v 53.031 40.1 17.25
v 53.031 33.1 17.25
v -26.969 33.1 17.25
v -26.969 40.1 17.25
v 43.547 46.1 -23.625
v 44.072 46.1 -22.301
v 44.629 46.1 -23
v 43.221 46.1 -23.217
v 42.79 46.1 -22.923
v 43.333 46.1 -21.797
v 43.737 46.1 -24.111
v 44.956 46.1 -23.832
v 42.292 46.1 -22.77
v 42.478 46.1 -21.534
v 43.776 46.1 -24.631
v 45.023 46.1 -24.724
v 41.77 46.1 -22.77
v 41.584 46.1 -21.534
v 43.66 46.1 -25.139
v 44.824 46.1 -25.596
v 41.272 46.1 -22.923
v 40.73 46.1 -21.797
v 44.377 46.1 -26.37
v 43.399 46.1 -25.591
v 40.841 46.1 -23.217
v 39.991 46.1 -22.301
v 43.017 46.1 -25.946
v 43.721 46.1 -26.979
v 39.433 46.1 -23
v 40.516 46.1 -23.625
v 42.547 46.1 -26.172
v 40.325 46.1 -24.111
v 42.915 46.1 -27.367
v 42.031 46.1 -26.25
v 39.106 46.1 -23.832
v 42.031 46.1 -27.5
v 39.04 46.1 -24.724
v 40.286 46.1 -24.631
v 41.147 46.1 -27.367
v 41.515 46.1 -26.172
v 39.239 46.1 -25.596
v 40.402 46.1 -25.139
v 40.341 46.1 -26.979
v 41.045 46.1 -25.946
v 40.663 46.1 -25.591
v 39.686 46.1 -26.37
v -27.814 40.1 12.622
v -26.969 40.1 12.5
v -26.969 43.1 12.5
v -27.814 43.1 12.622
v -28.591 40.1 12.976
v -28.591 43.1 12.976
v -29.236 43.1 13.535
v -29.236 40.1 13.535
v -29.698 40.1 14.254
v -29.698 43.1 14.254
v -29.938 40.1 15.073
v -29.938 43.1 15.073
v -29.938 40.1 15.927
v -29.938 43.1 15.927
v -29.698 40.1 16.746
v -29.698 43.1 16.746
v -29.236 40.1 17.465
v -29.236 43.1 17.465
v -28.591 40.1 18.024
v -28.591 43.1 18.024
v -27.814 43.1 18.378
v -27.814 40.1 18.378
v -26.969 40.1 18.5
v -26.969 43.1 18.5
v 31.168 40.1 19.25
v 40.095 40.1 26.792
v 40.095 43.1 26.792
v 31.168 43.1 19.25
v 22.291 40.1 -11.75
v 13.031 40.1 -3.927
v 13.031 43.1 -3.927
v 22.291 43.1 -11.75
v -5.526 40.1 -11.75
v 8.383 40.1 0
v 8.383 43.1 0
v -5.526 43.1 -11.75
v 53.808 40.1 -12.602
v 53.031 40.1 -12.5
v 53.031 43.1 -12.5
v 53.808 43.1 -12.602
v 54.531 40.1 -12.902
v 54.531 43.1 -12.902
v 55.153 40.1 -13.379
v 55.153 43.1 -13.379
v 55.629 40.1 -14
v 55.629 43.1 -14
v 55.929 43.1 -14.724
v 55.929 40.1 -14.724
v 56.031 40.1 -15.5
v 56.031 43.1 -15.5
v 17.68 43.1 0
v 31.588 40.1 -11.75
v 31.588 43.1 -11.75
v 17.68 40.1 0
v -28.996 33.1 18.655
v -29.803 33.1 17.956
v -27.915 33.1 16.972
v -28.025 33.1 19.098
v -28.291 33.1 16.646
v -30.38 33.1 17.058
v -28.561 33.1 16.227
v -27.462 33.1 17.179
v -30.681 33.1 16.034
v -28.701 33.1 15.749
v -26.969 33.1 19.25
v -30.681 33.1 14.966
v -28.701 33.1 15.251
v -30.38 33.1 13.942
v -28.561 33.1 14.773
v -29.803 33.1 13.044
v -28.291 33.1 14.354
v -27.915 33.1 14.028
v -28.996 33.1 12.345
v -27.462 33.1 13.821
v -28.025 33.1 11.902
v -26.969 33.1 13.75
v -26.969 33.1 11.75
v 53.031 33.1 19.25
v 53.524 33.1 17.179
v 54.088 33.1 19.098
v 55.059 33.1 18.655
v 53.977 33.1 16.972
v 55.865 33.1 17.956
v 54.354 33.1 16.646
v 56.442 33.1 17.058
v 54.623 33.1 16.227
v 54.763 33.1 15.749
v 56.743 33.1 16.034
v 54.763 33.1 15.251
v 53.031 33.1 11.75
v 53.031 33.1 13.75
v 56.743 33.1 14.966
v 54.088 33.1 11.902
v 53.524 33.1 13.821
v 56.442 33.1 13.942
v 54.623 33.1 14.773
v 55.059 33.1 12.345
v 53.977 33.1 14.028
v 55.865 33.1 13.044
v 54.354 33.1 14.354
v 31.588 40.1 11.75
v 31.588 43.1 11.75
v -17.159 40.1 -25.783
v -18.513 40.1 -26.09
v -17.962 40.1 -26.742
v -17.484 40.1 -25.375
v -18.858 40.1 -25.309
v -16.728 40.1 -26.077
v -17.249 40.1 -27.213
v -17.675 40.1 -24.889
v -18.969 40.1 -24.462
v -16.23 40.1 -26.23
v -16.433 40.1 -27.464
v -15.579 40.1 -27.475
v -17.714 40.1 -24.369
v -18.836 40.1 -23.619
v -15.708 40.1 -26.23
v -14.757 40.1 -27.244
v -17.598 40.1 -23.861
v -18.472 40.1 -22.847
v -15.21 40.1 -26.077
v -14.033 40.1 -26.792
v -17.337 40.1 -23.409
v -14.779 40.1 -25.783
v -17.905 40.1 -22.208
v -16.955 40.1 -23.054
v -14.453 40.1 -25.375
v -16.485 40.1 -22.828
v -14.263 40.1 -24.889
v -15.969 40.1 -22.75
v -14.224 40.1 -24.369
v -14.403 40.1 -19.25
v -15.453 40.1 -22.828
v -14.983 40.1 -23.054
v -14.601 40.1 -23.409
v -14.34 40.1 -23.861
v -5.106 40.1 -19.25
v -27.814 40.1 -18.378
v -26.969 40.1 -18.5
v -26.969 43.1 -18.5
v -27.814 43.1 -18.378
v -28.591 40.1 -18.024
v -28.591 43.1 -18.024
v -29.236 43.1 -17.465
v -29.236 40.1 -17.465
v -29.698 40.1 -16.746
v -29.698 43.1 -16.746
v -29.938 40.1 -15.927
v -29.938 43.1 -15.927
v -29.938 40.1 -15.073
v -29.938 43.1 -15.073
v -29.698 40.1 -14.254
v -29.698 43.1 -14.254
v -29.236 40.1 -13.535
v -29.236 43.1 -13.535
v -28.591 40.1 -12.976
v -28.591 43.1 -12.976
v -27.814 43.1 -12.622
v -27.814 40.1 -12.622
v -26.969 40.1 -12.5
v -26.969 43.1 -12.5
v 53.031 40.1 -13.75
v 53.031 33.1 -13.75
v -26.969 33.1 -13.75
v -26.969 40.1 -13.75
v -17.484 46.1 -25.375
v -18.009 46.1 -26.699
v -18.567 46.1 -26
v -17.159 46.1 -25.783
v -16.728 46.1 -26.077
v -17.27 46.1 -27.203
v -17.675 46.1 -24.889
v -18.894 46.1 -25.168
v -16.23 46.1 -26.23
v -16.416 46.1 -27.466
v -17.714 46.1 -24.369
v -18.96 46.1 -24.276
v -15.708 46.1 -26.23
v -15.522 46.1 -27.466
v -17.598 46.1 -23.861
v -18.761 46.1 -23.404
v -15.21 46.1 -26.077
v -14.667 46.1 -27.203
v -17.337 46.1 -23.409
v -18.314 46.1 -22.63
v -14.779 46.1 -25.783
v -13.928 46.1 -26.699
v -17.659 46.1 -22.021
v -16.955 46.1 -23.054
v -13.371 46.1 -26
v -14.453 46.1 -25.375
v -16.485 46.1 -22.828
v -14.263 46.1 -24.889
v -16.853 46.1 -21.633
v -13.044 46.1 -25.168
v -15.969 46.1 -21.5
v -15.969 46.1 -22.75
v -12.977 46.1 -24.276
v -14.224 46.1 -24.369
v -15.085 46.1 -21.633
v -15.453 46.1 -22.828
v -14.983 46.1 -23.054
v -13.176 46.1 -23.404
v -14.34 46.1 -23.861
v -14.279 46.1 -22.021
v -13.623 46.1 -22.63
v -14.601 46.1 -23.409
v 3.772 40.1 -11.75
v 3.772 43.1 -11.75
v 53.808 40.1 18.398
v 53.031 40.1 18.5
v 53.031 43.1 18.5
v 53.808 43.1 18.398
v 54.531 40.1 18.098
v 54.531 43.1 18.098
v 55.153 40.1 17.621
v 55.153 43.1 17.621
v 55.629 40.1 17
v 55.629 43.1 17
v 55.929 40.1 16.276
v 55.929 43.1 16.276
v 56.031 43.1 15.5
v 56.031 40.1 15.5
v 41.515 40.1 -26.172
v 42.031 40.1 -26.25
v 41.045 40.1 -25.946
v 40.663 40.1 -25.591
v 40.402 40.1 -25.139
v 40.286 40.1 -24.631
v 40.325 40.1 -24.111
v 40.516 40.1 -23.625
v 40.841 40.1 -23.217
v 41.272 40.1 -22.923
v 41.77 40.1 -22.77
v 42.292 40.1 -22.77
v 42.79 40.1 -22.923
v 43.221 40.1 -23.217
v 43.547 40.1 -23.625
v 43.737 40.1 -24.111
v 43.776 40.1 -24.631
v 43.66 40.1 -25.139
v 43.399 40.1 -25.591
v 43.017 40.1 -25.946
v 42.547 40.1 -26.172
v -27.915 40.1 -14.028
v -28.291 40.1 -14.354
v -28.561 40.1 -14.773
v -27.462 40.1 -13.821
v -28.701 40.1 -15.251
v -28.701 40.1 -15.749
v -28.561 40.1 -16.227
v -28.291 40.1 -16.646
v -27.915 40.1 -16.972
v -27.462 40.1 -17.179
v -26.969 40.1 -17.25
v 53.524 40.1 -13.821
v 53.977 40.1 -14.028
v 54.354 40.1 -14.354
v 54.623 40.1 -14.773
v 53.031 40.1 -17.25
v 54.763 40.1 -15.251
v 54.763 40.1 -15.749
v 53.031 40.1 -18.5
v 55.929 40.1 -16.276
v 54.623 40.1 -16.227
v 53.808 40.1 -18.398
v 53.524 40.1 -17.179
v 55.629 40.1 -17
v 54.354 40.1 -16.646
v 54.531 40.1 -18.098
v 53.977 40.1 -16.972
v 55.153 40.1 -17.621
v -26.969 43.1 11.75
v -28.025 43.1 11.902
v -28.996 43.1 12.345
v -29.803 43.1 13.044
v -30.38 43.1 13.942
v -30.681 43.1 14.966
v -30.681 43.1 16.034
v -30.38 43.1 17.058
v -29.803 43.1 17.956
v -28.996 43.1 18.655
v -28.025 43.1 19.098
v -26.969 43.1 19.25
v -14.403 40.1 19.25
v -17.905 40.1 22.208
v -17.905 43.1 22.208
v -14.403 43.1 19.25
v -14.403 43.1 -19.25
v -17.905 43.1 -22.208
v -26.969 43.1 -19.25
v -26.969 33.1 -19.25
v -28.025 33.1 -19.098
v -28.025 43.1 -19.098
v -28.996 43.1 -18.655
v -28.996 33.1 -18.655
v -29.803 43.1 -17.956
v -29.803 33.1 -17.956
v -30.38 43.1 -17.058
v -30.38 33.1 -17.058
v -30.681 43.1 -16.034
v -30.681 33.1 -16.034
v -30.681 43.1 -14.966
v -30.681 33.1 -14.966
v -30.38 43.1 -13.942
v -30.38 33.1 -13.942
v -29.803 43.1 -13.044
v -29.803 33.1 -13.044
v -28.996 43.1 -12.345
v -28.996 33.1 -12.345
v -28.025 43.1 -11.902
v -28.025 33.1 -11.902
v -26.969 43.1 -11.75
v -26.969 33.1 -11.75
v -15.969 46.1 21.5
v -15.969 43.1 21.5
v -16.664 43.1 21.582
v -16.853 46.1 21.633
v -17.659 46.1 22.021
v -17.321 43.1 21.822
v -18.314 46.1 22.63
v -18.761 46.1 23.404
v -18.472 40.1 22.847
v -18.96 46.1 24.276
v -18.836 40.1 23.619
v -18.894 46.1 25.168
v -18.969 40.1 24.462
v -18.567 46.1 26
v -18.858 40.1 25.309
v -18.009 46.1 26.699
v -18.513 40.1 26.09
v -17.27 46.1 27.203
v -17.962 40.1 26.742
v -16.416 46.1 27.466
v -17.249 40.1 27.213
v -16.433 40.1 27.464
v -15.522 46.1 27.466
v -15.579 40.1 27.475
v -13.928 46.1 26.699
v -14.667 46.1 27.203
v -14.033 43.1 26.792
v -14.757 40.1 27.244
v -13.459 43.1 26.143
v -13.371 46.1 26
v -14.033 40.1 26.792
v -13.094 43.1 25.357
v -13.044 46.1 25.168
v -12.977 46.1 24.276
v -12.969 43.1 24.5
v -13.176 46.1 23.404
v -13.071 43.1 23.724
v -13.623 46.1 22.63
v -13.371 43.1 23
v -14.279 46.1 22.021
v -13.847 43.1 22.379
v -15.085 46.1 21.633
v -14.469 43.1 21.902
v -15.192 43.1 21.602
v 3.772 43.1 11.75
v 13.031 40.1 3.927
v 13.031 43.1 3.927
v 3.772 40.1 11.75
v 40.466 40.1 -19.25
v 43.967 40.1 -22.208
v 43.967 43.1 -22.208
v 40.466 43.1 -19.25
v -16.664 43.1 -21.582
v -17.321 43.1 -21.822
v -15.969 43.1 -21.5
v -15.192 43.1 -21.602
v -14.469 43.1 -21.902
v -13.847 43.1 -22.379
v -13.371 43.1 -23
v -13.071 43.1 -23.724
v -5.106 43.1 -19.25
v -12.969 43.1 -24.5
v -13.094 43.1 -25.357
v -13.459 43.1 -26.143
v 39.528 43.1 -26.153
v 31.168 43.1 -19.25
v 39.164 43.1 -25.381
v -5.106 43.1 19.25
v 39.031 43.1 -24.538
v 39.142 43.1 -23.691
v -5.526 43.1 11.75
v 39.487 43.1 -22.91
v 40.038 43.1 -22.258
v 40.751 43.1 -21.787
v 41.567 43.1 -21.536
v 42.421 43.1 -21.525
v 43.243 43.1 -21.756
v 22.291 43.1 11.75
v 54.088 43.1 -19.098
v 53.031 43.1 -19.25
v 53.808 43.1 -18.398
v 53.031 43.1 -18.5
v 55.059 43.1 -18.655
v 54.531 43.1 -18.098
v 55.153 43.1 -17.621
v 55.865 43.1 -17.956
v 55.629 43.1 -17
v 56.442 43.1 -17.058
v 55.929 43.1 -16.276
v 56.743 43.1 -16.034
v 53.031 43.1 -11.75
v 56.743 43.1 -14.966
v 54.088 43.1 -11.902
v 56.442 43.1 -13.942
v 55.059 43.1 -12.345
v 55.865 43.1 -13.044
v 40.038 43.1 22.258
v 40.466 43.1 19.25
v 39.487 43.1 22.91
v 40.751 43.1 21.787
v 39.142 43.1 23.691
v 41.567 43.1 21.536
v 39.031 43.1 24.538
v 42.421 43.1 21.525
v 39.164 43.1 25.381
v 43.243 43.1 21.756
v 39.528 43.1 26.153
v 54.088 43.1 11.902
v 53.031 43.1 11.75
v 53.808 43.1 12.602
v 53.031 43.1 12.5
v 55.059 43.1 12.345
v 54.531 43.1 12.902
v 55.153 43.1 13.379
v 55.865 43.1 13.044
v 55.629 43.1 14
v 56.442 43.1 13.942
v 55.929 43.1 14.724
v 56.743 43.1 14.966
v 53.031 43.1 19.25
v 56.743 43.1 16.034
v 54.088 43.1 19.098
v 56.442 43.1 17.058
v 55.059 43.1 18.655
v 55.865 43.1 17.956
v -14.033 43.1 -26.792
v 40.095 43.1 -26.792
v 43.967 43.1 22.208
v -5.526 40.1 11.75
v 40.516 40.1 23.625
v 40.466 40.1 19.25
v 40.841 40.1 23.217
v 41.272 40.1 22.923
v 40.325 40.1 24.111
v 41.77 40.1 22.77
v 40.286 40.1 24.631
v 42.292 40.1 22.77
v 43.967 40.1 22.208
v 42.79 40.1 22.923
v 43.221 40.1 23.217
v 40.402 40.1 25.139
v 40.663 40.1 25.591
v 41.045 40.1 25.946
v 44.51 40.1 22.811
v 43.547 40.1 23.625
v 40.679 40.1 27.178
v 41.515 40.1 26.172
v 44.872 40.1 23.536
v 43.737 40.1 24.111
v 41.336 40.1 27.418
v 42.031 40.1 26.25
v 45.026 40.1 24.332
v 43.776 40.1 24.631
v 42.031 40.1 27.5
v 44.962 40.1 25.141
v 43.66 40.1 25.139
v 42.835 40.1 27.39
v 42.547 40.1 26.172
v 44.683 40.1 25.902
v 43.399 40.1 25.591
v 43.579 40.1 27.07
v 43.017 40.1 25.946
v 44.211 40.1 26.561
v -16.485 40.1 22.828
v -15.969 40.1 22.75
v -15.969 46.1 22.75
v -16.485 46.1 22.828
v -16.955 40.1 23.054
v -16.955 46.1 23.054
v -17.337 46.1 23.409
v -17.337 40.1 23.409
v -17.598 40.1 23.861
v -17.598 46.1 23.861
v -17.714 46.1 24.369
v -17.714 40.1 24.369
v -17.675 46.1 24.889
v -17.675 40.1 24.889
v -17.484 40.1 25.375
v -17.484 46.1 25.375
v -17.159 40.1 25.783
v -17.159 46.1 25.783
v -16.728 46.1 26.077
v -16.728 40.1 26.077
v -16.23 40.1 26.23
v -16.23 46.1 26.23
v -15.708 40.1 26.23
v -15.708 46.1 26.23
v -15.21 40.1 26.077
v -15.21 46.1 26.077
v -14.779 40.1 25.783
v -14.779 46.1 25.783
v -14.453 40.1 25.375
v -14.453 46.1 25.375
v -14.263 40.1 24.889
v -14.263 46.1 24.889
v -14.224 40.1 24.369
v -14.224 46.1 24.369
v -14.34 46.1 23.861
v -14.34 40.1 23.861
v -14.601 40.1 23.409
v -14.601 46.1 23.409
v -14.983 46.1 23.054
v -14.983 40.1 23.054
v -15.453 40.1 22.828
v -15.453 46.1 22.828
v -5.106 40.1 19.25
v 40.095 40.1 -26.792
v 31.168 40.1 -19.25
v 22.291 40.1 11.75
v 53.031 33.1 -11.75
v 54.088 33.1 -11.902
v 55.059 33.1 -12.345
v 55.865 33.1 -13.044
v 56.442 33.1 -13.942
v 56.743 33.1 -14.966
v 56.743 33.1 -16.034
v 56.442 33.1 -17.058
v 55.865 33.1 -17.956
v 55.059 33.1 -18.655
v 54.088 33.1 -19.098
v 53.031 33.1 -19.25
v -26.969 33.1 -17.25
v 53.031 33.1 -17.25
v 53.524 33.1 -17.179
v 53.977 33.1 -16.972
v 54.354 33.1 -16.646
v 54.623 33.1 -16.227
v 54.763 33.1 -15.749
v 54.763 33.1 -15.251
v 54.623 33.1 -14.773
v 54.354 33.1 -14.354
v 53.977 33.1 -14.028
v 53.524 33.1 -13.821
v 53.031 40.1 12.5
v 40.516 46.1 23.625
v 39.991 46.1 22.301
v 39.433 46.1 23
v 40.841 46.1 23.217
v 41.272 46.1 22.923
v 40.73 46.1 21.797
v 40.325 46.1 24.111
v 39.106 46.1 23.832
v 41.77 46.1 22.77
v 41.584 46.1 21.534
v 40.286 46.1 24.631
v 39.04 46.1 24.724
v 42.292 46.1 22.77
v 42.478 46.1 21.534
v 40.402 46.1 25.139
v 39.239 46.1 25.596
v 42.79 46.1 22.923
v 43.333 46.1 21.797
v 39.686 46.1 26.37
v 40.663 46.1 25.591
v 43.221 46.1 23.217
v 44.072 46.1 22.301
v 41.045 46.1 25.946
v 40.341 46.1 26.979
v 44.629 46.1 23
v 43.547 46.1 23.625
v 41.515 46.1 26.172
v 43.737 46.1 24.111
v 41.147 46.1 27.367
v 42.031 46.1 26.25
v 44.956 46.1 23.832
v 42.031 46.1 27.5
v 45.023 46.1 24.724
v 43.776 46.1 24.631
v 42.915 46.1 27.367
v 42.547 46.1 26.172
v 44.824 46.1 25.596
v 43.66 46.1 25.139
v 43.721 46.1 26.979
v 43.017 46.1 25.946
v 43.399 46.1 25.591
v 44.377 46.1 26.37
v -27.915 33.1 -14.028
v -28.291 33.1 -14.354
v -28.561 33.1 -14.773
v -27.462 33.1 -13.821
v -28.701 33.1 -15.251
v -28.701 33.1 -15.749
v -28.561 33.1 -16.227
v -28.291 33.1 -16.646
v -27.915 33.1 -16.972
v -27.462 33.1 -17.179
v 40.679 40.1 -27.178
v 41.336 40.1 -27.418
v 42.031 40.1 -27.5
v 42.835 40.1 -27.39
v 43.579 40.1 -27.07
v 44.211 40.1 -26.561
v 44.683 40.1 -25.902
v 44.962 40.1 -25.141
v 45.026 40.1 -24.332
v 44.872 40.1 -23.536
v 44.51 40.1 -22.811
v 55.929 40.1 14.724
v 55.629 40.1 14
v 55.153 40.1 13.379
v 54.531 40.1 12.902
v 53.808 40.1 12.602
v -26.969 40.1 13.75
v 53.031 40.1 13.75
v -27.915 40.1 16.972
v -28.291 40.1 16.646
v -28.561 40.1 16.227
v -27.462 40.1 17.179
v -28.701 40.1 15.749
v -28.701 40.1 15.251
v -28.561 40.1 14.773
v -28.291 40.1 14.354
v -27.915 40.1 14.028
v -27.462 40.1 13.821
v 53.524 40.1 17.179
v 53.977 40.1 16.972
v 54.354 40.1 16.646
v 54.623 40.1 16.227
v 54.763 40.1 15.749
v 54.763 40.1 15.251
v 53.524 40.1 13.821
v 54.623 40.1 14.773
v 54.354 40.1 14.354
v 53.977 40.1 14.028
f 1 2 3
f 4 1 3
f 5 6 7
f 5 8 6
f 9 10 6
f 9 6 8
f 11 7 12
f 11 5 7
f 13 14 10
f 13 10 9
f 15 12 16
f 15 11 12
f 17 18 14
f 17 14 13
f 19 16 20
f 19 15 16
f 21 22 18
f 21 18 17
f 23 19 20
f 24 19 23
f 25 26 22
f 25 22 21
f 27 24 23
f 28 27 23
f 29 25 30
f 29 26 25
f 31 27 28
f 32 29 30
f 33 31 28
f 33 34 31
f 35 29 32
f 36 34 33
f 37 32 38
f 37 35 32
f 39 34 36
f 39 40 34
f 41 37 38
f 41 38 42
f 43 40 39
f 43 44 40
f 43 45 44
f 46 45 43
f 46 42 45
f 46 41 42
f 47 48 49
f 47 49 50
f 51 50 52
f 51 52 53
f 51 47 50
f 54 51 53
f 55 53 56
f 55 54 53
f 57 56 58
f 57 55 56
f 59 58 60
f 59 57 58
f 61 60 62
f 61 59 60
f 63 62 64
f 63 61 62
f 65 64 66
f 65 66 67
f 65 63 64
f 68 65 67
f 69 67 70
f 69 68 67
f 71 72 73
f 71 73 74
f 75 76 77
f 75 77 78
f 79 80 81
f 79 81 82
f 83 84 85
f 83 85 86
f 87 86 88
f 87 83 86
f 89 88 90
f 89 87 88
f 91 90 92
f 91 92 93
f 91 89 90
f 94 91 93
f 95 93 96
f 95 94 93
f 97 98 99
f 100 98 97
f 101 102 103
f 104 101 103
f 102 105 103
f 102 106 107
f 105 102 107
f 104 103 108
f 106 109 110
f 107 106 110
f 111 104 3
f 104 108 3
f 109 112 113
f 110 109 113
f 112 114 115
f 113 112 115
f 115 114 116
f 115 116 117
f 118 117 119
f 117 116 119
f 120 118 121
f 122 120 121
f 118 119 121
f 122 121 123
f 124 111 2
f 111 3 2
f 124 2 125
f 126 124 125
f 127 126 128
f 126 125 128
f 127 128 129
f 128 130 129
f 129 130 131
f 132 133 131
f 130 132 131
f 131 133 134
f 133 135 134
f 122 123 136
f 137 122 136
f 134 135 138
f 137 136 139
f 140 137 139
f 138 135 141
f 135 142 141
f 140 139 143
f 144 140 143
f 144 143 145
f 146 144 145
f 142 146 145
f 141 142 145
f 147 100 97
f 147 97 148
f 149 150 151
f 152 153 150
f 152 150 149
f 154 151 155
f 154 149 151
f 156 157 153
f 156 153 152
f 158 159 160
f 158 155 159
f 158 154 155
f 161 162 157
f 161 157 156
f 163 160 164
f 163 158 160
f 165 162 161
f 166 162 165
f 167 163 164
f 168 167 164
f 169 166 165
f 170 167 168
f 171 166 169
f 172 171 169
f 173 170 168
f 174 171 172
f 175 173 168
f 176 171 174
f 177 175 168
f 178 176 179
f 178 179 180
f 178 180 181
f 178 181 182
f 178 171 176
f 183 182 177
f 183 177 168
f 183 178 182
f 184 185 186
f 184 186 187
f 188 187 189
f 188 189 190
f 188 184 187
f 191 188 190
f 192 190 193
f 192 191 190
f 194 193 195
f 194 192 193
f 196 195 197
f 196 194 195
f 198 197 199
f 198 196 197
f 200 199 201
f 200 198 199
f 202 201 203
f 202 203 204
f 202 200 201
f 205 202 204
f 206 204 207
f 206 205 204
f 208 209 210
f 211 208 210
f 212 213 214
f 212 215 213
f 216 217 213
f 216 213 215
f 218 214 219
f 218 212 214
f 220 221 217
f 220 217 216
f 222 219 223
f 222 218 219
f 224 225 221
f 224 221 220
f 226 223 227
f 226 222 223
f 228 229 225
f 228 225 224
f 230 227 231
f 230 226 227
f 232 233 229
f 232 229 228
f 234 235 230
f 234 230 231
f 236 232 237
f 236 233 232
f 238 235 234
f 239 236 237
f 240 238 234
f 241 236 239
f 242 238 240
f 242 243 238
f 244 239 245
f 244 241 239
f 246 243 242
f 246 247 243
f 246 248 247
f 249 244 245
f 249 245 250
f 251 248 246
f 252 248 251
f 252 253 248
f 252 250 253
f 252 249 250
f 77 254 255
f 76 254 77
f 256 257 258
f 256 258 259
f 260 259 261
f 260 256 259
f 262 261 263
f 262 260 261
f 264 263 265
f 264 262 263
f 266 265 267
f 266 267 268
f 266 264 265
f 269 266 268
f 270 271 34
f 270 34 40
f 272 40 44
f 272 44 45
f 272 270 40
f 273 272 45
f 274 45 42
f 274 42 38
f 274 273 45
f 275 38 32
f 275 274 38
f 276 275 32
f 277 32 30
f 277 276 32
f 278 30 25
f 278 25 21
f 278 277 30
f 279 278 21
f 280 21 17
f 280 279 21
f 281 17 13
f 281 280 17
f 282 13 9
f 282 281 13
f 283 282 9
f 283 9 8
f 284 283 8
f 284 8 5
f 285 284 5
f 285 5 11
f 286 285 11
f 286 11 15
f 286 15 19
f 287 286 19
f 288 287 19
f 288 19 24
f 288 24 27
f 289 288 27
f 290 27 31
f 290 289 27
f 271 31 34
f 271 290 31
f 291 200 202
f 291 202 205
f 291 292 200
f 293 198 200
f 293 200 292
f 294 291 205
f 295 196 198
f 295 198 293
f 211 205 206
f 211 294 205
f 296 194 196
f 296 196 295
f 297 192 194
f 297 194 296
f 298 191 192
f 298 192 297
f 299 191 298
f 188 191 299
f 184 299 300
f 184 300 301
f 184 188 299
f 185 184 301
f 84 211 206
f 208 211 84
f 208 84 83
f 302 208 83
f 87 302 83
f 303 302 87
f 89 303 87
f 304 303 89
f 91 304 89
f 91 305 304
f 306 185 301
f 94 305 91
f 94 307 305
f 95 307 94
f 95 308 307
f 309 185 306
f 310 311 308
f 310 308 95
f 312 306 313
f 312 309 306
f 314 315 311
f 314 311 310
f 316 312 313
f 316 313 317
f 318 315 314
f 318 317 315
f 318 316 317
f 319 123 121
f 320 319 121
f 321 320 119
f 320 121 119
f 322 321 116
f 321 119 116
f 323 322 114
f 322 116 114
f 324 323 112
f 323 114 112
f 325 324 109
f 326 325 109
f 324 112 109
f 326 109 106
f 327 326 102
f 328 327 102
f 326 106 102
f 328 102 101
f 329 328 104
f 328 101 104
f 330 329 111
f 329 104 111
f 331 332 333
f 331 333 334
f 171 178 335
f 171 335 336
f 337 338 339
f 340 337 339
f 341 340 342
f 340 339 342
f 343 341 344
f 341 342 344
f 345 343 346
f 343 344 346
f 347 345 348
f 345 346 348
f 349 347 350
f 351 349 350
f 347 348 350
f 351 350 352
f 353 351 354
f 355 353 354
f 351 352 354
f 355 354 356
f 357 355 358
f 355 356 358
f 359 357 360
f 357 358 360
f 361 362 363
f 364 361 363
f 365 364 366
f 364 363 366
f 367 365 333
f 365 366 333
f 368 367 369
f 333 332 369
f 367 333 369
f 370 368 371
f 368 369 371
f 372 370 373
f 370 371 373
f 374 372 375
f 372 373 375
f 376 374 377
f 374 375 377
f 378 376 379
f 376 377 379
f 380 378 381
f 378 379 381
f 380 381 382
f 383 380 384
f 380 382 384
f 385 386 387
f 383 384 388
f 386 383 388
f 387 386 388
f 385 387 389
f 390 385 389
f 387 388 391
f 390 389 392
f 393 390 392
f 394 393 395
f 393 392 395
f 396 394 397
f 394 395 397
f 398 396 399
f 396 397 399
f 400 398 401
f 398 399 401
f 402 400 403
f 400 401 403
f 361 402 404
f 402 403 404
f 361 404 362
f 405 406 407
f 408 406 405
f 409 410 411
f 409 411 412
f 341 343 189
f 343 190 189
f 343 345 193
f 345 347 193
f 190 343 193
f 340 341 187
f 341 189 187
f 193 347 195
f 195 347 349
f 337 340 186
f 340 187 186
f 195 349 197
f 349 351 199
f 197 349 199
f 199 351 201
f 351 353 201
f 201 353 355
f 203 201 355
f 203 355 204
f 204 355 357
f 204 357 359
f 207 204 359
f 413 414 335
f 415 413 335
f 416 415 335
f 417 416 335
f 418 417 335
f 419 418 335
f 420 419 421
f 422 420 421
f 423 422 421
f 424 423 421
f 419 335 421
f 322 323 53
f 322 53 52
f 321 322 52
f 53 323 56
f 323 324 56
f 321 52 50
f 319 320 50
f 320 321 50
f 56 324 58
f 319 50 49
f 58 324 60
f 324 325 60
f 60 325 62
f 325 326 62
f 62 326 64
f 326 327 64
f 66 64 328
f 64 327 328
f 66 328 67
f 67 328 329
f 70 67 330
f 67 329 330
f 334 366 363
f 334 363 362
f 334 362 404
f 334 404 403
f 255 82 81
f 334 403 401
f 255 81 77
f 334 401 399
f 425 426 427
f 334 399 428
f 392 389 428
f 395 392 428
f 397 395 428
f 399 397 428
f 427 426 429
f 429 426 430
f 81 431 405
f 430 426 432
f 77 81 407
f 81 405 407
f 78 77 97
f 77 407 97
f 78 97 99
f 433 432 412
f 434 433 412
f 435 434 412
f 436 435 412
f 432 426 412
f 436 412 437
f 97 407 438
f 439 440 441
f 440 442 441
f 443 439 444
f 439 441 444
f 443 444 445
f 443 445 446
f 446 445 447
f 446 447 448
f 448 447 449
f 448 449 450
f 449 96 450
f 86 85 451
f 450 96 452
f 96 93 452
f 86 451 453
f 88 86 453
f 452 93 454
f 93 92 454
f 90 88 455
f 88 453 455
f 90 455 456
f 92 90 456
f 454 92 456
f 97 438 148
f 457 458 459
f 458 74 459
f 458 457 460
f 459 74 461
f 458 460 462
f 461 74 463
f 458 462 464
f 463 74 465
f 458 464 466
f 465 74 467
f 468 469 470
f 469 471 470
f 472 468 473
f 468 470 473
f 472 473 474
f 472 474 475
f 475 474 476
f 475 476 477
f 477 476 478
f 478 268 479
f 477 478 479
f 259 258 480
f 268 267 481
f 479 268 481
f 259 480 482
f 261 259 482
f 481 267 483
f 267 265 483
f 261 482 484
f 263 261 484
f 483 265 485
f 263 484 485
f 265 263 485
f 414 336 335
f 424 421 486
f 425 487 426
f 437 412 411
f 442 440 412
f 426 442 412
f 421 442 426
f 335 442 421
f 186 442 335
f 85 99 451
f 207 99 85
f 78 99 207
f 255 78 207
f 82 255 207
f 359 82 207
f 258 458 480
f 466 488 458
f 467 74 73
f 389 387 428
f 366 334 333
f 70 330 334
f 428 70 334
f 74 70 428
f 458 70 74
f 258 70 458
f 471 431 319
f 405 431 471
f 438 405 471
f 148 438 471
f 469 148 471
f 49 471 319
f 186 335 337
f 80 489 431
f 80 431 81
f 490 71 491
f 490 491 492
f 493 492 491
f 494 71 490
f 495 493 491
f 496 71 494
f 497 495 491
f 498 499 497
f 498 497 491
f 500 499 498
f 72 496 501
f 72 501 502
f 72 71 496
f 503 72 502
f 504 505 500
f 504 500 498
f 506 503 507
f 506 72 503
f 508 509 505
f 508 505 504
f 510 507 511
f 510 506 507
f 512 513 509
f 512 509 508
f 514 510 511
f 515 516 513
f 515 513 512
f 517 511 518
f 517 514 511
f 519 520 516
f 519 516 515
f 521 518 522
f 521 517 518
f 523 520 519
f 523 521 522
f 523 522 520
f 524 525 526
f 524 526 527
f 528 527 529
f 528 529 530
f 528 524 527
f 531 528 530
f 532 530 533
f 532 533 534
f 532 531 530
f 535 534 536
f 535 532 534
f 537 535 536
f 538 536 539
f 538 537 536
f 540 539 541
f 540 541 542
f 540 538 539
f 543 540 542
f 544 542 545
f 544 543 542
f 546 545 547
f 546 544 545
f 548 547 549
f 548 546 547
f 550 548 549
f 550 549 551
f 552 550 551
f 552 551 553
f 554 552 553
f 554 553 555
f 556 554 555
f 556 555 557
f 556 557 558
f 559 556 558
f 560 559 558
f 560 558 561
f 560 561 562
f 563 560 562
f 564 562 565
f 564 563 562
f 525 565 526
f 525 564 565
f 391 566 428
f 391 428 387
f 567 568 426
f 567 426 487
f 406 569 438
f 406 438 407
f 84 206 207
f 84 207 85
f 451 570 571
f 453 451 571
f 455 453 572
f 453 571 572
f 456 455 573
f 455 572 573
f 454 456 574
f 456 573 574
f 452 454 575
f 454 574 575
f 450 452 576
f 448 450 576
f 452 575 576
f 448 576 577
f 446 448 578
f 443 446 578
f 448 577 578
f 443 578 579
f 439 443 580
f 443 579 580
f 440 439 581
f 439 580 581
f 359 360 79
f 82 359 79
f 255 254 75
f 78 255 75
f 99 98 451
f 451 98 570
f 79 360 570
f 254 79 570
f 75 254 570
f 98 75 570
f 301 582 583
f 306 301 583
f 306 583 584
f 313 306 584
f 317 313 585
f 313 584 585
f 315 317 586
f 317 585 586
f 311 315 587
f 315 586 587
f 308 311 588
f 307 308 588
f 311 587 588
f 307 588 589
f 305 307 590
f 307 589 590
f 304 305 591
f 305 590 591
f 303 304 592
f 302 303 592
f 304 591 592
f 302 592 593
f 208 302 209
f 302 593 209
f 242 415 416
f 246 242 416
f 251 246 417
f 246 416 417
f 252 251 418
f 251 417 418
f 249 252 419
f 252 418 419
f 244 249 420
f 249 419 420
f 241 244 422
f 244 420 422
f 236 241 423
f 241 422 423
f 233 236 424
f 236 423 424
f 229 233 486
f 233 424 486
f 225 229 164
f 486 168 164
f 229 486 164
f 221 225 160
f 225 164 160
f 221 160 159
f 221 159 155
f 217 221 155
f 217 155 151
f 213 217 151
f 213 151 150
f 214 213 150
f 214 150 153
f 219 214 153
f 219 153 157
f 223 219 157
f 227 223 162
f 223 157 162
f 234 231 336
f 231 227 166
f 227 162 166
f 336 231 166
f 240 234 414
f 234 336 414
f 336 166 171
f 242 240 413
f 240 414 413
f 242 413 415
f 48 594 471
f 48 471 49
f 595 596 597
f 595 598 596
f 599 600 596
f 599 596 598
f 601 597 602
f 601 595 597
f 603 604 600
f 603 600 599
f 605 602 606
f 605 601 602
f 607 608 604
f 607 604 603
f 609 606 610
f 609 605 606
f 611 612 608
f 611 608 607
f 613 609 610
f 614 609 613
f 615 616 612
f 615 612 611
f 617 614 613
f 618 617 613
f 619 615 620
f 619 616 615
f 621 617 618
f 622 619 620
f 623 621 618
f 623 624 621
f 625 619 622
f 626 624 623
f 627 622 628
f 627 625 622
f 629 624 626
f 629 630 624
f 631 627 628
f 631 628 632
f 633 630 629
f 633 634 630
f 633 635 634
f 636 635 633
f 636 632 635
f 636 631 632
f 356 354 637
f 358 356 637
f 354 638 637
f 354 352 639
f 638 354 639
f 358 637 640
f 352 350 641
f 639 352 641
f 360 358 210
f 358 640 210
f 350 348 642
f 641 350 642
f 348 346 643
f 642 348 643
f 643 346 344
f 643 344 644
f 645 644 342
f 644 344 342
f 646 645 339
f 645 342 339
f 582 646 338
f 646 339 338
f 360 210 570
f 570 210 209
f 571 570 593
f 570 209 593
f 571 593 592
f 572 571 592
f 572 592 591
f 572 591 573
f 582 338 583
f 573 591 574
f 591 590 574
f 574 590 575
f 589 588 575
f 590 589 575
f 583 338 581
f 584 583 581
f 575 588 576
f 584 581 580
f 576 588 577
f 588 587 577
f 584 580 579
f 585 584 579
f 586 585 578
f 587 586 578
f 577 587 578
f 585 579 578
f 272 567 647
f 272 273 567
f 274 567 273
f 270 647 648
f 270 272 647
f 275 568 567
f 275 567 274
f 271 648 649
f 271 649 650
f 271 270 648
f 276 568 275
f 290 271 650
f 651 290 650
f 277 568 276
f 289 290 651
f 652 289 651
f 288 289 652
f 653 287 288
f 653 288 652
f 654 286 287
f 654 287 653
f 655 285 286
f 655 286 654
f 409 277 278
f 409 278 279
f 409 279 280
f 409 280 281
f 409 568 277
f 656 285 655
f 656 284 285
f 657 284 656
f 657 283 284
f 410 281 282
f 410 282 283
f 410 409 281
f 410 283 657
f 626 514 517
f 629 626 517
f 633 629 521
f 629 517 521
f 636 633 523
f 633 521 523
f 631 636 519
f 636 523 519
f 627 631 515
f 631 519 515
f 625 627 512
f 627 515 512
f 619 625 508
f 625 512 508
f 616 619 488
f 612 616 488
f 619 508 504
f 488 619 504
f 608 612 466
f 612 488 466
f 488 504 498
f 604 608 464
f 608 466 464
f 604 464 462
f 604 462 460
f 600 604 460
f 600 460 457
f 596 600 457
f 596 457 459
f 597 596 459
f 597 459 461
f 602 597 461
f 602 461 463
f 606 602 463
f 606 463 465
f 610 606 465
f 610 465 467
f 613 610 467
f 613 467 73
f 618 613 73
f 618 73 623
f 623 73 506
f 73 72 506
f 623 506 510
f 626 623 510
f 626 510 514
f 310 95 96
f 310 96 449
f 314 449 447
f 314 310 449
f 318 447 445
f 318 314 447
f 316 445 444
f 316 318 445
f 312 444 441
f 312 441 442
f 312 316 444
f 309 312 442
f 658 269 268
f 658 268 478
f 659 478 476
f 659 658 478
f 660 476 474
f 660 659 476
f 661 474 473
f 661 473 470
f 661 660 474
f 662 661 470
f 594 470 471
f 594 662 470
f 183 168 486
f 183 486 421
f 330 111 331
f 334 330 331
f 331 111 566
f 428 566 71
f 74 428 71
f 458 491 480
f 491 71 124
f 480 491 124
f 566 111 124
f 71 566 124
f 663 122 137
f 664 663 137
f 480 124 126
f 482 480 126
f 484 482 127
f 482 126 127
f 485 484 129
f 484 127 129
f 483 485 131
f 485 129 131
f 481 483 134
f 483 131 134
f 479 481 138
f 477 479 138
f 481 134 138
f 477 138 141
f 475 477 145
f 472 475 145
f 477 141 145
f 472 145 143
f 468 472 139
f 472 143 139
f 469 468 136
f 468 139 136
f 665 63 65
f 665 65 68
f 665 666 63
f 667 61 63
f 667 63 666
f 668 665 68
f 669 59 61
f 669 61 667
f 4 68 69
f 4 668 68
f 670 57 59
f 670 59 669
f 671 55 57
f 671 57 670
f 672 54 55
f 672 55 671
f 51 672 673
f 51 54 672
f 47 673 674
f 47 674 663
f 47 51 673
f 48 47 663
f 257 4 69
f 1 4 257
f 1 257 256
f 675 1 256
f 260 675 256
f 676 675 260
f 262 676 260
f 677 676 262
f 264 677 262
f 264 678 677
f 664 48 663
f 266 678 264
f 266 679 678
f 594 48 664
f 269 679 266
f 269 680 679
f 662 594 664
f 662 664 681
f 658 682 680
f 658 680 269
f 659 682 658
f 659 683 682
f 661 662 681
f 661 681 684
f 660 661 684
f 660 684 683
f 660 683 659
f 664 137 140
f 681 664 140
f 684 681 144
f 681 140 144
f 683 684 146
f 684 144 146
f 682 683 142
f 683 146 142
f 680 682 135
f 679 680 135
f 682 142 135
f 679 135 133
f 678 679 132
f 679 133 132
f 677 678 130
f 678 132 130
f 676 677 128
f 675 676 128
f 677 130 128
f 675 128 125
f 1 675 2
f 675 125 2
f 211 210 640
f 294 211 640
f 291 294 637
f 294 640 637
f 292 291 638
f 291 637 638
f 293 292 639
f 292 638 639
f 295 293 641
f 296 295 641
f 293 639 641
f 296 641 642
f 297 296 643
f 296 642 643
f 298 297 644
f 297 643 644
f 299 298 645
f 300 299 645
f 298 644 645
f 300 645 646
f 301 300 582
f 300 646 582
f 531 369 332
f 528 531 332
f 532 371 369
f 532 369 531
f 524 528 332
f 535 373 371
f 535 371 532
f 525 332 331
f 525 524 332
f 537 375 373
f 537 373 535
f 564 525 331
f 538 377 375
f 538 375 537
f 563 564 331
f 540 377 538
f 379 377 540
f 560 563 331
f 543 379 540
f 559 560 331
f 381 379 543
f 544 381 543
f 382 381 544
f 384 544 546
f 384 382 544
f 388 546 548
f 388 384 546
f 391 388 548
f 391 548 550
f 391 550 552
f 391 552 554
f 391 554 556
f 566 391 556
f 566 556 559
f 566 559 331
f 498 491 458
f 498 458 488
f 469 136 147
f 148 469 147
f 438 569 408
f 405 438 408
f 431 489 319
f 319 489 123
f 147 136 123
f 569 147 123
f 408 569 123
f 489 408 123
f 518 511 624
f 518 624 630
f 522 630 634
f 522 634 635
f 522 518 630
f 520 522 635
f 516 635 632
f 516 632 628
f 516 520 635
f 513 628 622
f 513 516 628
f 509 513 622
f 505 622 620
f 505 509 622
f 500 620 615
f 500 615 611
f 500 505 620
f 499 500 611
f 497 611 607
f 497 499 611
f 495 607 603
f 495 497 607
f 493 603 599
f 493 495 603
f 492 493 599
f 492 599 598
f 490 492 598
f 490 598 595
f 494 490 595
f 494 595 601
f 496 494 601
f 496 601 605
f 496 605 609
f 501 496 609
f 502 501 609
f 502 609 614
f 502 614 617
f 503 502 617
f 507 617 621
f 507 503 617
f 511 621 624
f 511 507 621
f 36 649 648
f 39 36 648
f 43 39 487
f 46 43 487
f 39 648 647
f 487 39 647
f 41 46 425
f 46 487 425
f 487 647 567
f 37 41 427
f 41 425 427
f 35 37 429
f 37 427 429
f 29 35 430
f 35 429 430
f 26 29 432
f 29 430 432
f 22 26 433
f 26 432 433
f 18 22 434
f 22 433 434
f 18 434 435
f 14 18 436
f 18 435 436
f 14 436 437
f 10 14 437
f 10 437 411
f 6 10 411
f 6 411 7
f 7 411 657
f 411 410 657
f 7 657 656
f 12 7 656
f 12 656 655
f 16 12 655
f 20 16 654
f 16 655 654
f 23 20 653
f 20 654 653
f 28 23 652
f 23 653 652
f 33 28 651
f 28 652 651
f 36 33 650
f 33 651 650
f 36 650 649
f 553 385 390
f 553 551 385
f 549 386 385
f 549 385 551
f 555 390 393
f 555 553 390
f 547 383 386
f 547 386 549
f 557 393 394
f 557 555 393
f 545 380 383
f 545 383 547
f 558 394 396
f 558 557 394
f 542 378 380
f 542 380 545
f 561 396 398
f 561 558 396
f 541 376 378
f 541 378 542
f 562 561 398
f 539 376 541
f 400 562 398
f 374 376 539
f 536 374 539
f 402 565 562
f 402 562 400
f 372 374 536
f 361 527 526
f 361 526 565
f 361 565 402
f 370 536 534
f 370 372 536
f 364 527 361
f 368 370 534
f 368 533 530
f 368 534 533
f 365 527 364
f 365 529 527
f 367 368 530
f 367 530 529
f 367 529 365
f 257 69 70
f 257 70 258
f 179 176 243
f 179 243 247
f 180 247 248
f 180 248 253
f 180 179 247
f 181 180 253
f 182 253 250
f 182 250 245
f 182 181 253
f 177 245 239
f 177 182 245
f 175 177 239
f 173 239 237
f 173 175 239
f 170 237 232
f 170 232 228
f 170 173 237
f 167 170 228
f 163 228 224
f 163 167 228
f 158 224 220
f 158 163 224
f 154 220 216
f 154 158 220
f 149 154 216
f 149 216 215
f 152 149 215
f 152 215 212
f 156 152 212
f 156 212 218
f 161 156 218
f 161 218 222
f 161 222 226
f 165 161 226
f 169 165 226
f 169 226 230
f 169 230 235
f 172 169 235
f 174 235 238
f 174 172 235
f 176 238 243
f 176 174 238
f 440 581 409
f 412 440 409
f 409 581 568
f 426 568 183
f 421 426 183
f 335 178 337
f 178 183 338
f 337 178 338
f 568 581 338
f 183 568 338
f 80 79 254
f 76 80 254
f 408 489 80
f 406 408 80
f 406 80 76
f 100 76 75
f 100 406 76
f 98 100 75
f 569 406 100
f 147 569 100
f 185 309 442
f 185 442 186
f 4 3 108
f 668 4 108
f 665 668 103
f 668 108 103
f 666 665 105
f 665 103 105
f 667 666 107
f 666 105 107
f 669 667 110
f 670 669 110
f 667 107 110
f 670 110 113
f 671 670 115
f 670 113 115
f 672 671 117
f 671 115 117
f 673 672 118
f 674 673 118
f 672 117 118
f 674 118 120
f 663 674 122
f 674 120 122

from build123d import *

# Parameters (mm, degrees)
BOSS_EXTRUDE1_DEPTH        = 10
BOSS_EXTRUDE1_2_DEPTH      = 10
CUT_EXTRUDE1_START         = -3
CUT_EXTRUDE1_DEPTH         = 3
BOSS_EXTRUDE2_DEPTH        = 3
BOSS_EXTRUDE2_DEPTH_BACK   = 3
SKETCH4_R                  = 3
SKETCH4_R_2                = 1.75
BOSS_EXTRUDE2_2_DEPTH      = 3
BOSS_EXTRUDE2_2_DEPTH_BACK = 3
BOSS_EXTRUDE2_3_DEPTH      = 3
BOSS_EXTRUDE2_3_DEPTH_BACK = 3
BOSS_EXTRUDE2_4_DEPTH      = 3
BOSS_EXTRUDE2_4_DEPTH_BACK = 3
BOSS_EXTRUDE3_DEPTH        = 3


with BuildPart() as part:
    # Sketch2 → Boss-Extrude1 (new body)
    with BuildSketch(Plane(origin=(0, 33.1, 0), x_dir=(1, 0, 0), z_dir=(0, 1, 0))):
        with BuildLine():
            ThreePointArc((53.031183993, 11.75), (56.781183993, 15.5), (53.031183993, 19.25))
            Line((53.031183993, 19.25), (-26.968816007, 19.25))
            ThreePointArc((-26.968816007, 19.25), (-30.718816007, 15.5), (-26.968816007, 11.75))
            Line((-26.968816007, 11.75), (53.031183993, 11.75))
        make_face()
        with BuildLine():
            ThreePointArc((-26.968816007, 13.75), (-28.718816007, 15.5), (-26.968816007, 17.25))
            Line((-26.968816007, 17.25), (53.031183993, 17.25))
            ThreePointArc((53.031183993, 17.25), (54.781183993, 15.5), (53.031183993, 13.75))
            Line((53.031183993, 13.75), (-26.968816007, 13.75))
        make_face(mode=Mode.SUBTRACT)
    extrude(amount=BOSS_EXTRUDE1_DEPTH)


with BuildPart() as body_2:
    # Sketch2 → Boss-Extrude1 2 (new body)
    with BuildSketch(Plane(origin=(0, 33.1, 0), x_dir=(1, 0, 0), z_dir=(0, 1, 0))):
        with BuildLine():
            ThreePointArc((-26.968816007, -11.75), (-30.718816007, -15.5), (-26.968816007, -19.25))
            Line((-26.968816007, -19.25), (53.031183993, -19.25))
            ThreePointArc((53.031183993, -19.25), (56.781183993, -15.5), (53.031183993, -11.75))
            Line((53.031183993, -11.75), (-26.968816007, -11.75))
        make_face()
        with BuildLine():
            ThreePointArc((-26.968816007, -17.25), (-28.718816007, -15.5), (-26.968816007, -13.75))
            Line((-26.968816007, -13.75), (53.031183993, -13.75))
            ThreePointArc((53.031183993, -13.75), (54.781183993, -15.5), (53.031183993, -17.25))
            Line((53.031183993, -17.25), (-26.968816007, -17.25))
        make_face(mode=Mode.SUBTRACT)
    extrude(amount=BOSS_EXTRUDE1_2_DEPTH)


with BuildPart() as cut_extrude1_tool:
    # Sketch3 → Cut-Extrude1 (new body)
    with BuildSketch(Plane(origin=(0, 43.1, 0), x_dir=(1, 0, 0), z_dir=(0, 1, 0)).offset(CUT_EXTRUDE1_START)):
        with BuildLine():
            ThreePointArc((-26.968816007, 13.75), (-28.718816007, 15.5), (-26.968816007, 17.25))
            Line((-26.968816007, 17.25), (-24.532117421, 17.25))
            ThreePointArc((-24.532117421, 17.25), (-25.599509613, 18.169269563), (-26.968816007, 18.5))
            ThreePointArc((-26.968816007, 18.5), (-29.968816007, 15.5), (-26.968816007, 12.5))
            ThreePointArc((-26.968816007, 12.5), (-25.599509613, 12.830730437), (-24.532117421, 13.75))
            Line((-24.532117421, 13.75), (-26.968816007, 13.75))
        make_face()
        with BuildLine():
            Line((-24.532117421, 17.25), (-26.968816007, 17.25))
            ThreePointArc((-26.968816007, 17.25), (-28.718816007, 15.5), (-26.968816007, 13.75))
            Line((-26.968816007, 13.75), (-24.532117421, 13.75))
            ThreePointArc((-24.532117421, 13.75), (-24.113111561, 14.580787228), (-23.968816007, 15.5))
            ThreePointArc((-23.968816007, 15.5), (-24.113111561, 16.419212772), (-24.532117421, 17.25))
        make_face()
        with BuildLine():
            ThreePointArc((-26.968816007, 18.5), (-25.599509613, 18.169269563), (-24.532117421, 17.25))
            Line((-24.532117421, 17.25), (50.594485407, 17.25))
            ThreePointArc((50.594485407, 17.25), (51.661877599, 18.169269563), (53.031183993, 18.5))
            Line((53.031183993, 18.5), (-26.968816007, 18.5))
        make_face()
        with BuildLine():
            Line((50.594485407, 13.75), (-24.532117421, 13.75))
            ThreePointArc((-24.532117421, 13.75), (-25.599509613, 12.830730437), (-26.968816007, 12.5))
            Line((-26.968816007, 12.5), (53.031183993, 12.5))
            ThreePointArc((53.031183993, 12.5), (51.661877599, 12.830730437), (50.594485407, 13.75))
        make_face()
        with BuildLine():
            ThreePointArc((53.031183993, 18.5), (51.661877599, 18.169269563), (50.594485407, 17.25))
            Line((50.594485407, 17.25), (53.031183993, 17.25))
            ThreePointArc((53.031183993, 17.25), (54.781183993, 15.5), (53.031183993, 13.75))
            Line((53.031183993, 13.75), (50.594485407, 13.75))
            ThreePointArc((50.594485407, 13.75), (51.661877599, 12.830730437), (53.031183993, 12.5))
            ThreePointArc((53.031183993, 12.5), (55.152504337, 13.378679656), (56.031183993, 15.5))
            ThreePointArc((56.031183993, 15.5), (55.152504337, 17.621320344), (53.031183993, 18.5))
        make_face()
        with BuildLine():
            Line((53.031183993, 17.25), (50.594485407, 17.25))
            ThreePointArc((50.594485407, 17.25), (50.031183993, 15.5), (50.594485407, 13.75))
            Line((50.594485407, 13.75), (53.031183993, 13.75))
            ThreePointArc((53.031183993, 13.75), (54.781183993, 15.5), (53.031183993, 17.25))
        make_face()
        with BuildLine():
            ThreePointArc((-26.968816007, -13.75), (-28.718816007, -15.5), (-26.968816007, -17.25))
            Line((-26.968816007, -17.25), (-24.532117421, -17.25))
            ThreePointArc((-24.532117421, -17.25), (-24.113111561, -16.419212772), (-23.968816007, -15.5))
            ThreePointArc((-23.968816007, -15.5), (-24.113111561, -14.580787228), (-24.532117421, -13.75))
            Line((-24.532117421, -13.75), (-26.968816007, -13.75))
        make_face()
        with BuildLine():
            Line((-24.532117421, -17.25), (-26.968816007, -17.25))
            ThreePointArc((-26.968816007, -17.25), (-28.718816007, -15.5), (-26.968816007, -13.75))
            Line((-26.968816007, -13.75), (-24.532117421, -13.75))
            ThreePointArc((-24.532117421, -13.75), (-25.599509613, -12.830730437), (-26.968816007, -12.5))
            ThreePointArc((-26.968816007, -12.5), (-29.968816007, -15.5), (-26.968816007, -18.5))
            ThreePointArc((-26.968816007, -18.5), (-25.599509613, -18.169269563), (-24.532117421, -17.25))
        make_face()
        with BuildLine():
            ThreePointArc((-26.968816007, -12.5), (-25.599509613, -12.830730437), (-24.532117421, -13.75))
            Line((-24.532117421, -13.75), (50.594485407, -13.75))
            ThreePointArc((50.594485407, -13.75), (51.661877599, -12.830730437), (53.031183993, -12.5))
            Line((53.031183993, -12.5), (-26.968816007, -12.5))
        make_face()
        with BuildLine():
            Line((50.594485407, -17.25), (-24.532117421, -17.25))
            ThreePointArc((-24.532117421, -17.25), (-25.599509613, -18.169269563), (-26.968816007, -18.5))
            Line((-26.968816007, -18.5), (53.031183993, -18.5))
            ThreePointArc((53.031183993, -18.5), (51.661877599, -18.169269563), (50.594485407, -17.25))
        make_face()
        with BuildLine():
            ThreePointArc((50.594485407, -13.75), (50.031183993, -15.5), (50.594485407, -17.25))
            Line((50.594485407, -17.25), (53.031183993, -17.25))
            ThreePointArc((53.031183993, -17.25), (54.781183993, -15.5), (53.031183993, -13.75))
            Line((53.031183993, -13.75), (50.594485407, -13.75))
        make_face()
        with BuildLine():
            Line((53.031183993, -17.25), (50.594485407, -17.25))
            ThreePointArc((50.594485407, -17.25), (51.661877599, -18.169269563), (53.031183993, -18.5))
            ThreePointArc((53.031183993, -18.5), (55.152504337, -17.621320344), (56.031183993, -15.5))
            ThreePointArc((56.031183993, -15.5), (55.152504337, -13.378679656), (53.031183993, -12.5))
            ThreePointArc((53.031183993, -12.5), (51.661877599, -12.830730437), (50.594485407, -13.75))
            Line((50.594485407, -13.75), (53.031183993, -13.75))
            ThreePointArc((53.031183993, -13.75), (54.781183993, -15.5), (53.031183993, -17.25))
        make_face()
    extrude(amount=CUT_EXTRUDE1_DEPTH)


with BuildPart() as part_1:
    add(part.part)

    # Cut-Extrude1: cut by cut_extrude1_tool
    add(cut_extrude1_tool.part, mode=Mode.SUBTRACT)



with BuildPart() as body_2_1:
    add(body_2.part)

    # Cut-Extrude1: cut by cut_extrude1_tool
    add(cut_extrude1_tool.part, mode=Mode.SUBTRACT)


with BuildPart() as body_3:
    # Sketch4 → Boss-Extrude2 (new, two sides: drawn at the far end of the back side and taken through both)
    with BuildSketch(Plane(origin=(0, 43.1, 0), x_dir=(1, 0, 0), z_dir=(0, 1, 0)).offset(-BOSS_EXTRUDE2_DEPTH_BACK)):
        with Locations(Location((-15.968816007, 24.5, 0), (0, 0, 270))):
            Circle(SKETCH4_R)
        with Locations(Location((-15.968816007, 24.5, 0), (0, 0, 270))):
            Circle(SKETCH4_R_2, mode=Mode.SUBTRACT)
    extrude(amount=BOSS_EXTRUDE2_DEPTH + BOSS_EXTRUDE2_DEPTH_BACK)


with BuildPart() as body_4:
    # Sketch4 → Boss-Extrude2 2 (new, two sides: drawn at the far end of the back side and taken through both)
    with BuildSketch(Plane(origin=(0, 43.1, 0), x_dir=(1, 0, 0), z_dir=(0, 1, 0)).offset(-BOSS_EXTRUDE2_2_DEPTH_BACK)):
        with Locations(Location((42.031183993, 24.5, 0), (0, 0, 90))):
            Circle(SKETCH4_R)
        with Locations(Location((42.031183993, 24.5, 0), (0, 0, 90))):
            Circle(SKETCH4_R_2, mode=Mode.SUBTRACT)
    extrude(amount=BOSS_EXTRUDE2_2_DEPTH + BOSS_EXTRUDE2_2_DEPTH_BACK)


with BuildPart() as body_5:
    # Sketch4 → Boss-Extrude2 3 (new, two sides: drawn at the far end of the back side and taken through both)
    with BuildSketch(Plane(origin=(0, 43.1, 0), x_dir=(1, 0, 0), z_dir=(0, 1, 0)).offset(-BOSS_EXTRUDE2_3_DEPTH_BACK)):
        with Locations(Location((42.031183993, -24.5, 0), (0, 0, 270))):
            Circle(SKETCH4_R)
        with Locations(Location((42.031183993, -24.5, 0), (0, 0, 270))):
            Circle(SKETCH4_R_2, mode=Mode.SUBTRACT)
    extrude(amount=BOSS_EXTRUDE2_3_DEPTH + BOSS_EXTRUDE2_3_DEPTH_BACK)


with BuildPart() as body_6:
    # Sketch4 → Boss-Extrude2 4 (new, two sides: drawn at the far end of the back side and taken through both)
    with BuildSketch(Plane(origin=(0, 43.1, 0), x_dir=(1, 0, 0), z_dir=(0, 1, 0)).offset(-BOSS_EXTRUDE2_4_DEPTH_BACK)):
        with Locations(Location((-15.968816007, -24.5, 0), (0, 0, 90))):
            Circle(SKETCH4_R)
        with Locations(Location((-15.968816007, -24.5, 0), (0, 0, 90))):
            Circle(SKETCH4_R_2, mode=Mode.SUBTRACT)
    extrude(amount=BOSS_EXTRUDE2_4_DEPTH + BOSS_EXTRUDE2_4_DEPTH_BACK)


with BuildPart() as part_2:
    add(part_1.part)

    add(body_2_1.part)  # Boss-Extrude3 merges body 2

    add(body_3.part)  # Boss-Extrude3 merges body 3

    add(body_4.part)  # Boss-Extrude3 merges body 4

    add(body_5.part)  # Boss-Extrude3 merges body 5

    add(body_6.part)  # Boss-Extrude3 merges body 6
    # Sketch5 → Boss-Extrude3 (add)
    with BuildSketch(Plane.XZ.offset(-40.1)):
        with BuildLine():
            Line((-14.403158686, -19.25), (-17.904870954, -22.208343123))
            ThreePointArc((-17.904870954, -22.208343123), (-14.705519692, -21.778955638), (-12.968816007, -24.5))
            ThreePointArc((-12.968816007, -24.5), (-13.247771645, -25.763296315), (-14.032761059, -26.791656877))
            Line((-14.032761059, -26.791656877), (-5.105901899, -19.25))
            Line((-5.105901899, -19.25), (-14.403158686, -19.25))
        make_face()
        Polygon((8.3825556, 0), (-5.525607665, -11.75), (3.771649121, -11.75), (13.031183993, -3.927289505), align=None)
        Polygon((13.031183993, 3.927289505), (8.3825556, 0), (13.031183993, -3.927289505), (17.679812386, 0), align=None)
        Polygon((17.679812386, 0), (13.031183993, -3.927289505), (22.290718865, -11.75), (31.587975652, -11.75), align=None)
        with BuildLine():
            Line((40.465526672, -19.25), (31.168269886, -19.25))
            Line((31.168269886, -19.25), (40.095129046, -26.791656877))
            ThreePointArc((40.095129046, -26.791656877), (39.739527117, -22.563945052), (43.967238941, -22.208343123))
            Line((43.967238941, -22.208343123), (40.465526672, -19.25))
        make_face()
        Polygon((-5.525607665, 11.75), (8.3825556, 0), (13.031183993, 3.927289505), (3.771649121, 11.75), align=None)
        with BuildLine():
            Line((-17.904870954, 22.208343123), (-14.403158686, 19.25))
            Line((-14.403158686, 19.25), (-5.105901899, 19.25))
            Line((-5.105901899, 19.25), (-14.032761059, 26.791656877))
            ThreePointArc((-14.032761059, 26.791656877), (-13.247771645, 25.763296315), (-12.968816007, 24.5))
            ThreePointArc((-12.968816007, 24.5), (-14.705519692, 21.778955638), (-17.904870954, 22.208343123))
        make_face()
        Polygon((22.290718865, 11.75), (13.031183993, 3.927289505), (17.679812386, 0), (31.587975652, 11.75), align=None)
        with BuildLine():
            Line((40.095129046, 26.791656877), (31.168269886, 19.25))
            Line((31.168269886, 19.25), (40.465526672, 19.25))
            Line((40.465526672, 19.25), (43.967238941, 22.208343123))
            ThreePointArc((43.967238941, 22.208343123), (39.739527117, 22.563945052), (40.095129046, 26.791656877))
        make_face()
    extrude(amount=-BOSS_EXTRUDE3_DEPTH)


solid = part_2.part
